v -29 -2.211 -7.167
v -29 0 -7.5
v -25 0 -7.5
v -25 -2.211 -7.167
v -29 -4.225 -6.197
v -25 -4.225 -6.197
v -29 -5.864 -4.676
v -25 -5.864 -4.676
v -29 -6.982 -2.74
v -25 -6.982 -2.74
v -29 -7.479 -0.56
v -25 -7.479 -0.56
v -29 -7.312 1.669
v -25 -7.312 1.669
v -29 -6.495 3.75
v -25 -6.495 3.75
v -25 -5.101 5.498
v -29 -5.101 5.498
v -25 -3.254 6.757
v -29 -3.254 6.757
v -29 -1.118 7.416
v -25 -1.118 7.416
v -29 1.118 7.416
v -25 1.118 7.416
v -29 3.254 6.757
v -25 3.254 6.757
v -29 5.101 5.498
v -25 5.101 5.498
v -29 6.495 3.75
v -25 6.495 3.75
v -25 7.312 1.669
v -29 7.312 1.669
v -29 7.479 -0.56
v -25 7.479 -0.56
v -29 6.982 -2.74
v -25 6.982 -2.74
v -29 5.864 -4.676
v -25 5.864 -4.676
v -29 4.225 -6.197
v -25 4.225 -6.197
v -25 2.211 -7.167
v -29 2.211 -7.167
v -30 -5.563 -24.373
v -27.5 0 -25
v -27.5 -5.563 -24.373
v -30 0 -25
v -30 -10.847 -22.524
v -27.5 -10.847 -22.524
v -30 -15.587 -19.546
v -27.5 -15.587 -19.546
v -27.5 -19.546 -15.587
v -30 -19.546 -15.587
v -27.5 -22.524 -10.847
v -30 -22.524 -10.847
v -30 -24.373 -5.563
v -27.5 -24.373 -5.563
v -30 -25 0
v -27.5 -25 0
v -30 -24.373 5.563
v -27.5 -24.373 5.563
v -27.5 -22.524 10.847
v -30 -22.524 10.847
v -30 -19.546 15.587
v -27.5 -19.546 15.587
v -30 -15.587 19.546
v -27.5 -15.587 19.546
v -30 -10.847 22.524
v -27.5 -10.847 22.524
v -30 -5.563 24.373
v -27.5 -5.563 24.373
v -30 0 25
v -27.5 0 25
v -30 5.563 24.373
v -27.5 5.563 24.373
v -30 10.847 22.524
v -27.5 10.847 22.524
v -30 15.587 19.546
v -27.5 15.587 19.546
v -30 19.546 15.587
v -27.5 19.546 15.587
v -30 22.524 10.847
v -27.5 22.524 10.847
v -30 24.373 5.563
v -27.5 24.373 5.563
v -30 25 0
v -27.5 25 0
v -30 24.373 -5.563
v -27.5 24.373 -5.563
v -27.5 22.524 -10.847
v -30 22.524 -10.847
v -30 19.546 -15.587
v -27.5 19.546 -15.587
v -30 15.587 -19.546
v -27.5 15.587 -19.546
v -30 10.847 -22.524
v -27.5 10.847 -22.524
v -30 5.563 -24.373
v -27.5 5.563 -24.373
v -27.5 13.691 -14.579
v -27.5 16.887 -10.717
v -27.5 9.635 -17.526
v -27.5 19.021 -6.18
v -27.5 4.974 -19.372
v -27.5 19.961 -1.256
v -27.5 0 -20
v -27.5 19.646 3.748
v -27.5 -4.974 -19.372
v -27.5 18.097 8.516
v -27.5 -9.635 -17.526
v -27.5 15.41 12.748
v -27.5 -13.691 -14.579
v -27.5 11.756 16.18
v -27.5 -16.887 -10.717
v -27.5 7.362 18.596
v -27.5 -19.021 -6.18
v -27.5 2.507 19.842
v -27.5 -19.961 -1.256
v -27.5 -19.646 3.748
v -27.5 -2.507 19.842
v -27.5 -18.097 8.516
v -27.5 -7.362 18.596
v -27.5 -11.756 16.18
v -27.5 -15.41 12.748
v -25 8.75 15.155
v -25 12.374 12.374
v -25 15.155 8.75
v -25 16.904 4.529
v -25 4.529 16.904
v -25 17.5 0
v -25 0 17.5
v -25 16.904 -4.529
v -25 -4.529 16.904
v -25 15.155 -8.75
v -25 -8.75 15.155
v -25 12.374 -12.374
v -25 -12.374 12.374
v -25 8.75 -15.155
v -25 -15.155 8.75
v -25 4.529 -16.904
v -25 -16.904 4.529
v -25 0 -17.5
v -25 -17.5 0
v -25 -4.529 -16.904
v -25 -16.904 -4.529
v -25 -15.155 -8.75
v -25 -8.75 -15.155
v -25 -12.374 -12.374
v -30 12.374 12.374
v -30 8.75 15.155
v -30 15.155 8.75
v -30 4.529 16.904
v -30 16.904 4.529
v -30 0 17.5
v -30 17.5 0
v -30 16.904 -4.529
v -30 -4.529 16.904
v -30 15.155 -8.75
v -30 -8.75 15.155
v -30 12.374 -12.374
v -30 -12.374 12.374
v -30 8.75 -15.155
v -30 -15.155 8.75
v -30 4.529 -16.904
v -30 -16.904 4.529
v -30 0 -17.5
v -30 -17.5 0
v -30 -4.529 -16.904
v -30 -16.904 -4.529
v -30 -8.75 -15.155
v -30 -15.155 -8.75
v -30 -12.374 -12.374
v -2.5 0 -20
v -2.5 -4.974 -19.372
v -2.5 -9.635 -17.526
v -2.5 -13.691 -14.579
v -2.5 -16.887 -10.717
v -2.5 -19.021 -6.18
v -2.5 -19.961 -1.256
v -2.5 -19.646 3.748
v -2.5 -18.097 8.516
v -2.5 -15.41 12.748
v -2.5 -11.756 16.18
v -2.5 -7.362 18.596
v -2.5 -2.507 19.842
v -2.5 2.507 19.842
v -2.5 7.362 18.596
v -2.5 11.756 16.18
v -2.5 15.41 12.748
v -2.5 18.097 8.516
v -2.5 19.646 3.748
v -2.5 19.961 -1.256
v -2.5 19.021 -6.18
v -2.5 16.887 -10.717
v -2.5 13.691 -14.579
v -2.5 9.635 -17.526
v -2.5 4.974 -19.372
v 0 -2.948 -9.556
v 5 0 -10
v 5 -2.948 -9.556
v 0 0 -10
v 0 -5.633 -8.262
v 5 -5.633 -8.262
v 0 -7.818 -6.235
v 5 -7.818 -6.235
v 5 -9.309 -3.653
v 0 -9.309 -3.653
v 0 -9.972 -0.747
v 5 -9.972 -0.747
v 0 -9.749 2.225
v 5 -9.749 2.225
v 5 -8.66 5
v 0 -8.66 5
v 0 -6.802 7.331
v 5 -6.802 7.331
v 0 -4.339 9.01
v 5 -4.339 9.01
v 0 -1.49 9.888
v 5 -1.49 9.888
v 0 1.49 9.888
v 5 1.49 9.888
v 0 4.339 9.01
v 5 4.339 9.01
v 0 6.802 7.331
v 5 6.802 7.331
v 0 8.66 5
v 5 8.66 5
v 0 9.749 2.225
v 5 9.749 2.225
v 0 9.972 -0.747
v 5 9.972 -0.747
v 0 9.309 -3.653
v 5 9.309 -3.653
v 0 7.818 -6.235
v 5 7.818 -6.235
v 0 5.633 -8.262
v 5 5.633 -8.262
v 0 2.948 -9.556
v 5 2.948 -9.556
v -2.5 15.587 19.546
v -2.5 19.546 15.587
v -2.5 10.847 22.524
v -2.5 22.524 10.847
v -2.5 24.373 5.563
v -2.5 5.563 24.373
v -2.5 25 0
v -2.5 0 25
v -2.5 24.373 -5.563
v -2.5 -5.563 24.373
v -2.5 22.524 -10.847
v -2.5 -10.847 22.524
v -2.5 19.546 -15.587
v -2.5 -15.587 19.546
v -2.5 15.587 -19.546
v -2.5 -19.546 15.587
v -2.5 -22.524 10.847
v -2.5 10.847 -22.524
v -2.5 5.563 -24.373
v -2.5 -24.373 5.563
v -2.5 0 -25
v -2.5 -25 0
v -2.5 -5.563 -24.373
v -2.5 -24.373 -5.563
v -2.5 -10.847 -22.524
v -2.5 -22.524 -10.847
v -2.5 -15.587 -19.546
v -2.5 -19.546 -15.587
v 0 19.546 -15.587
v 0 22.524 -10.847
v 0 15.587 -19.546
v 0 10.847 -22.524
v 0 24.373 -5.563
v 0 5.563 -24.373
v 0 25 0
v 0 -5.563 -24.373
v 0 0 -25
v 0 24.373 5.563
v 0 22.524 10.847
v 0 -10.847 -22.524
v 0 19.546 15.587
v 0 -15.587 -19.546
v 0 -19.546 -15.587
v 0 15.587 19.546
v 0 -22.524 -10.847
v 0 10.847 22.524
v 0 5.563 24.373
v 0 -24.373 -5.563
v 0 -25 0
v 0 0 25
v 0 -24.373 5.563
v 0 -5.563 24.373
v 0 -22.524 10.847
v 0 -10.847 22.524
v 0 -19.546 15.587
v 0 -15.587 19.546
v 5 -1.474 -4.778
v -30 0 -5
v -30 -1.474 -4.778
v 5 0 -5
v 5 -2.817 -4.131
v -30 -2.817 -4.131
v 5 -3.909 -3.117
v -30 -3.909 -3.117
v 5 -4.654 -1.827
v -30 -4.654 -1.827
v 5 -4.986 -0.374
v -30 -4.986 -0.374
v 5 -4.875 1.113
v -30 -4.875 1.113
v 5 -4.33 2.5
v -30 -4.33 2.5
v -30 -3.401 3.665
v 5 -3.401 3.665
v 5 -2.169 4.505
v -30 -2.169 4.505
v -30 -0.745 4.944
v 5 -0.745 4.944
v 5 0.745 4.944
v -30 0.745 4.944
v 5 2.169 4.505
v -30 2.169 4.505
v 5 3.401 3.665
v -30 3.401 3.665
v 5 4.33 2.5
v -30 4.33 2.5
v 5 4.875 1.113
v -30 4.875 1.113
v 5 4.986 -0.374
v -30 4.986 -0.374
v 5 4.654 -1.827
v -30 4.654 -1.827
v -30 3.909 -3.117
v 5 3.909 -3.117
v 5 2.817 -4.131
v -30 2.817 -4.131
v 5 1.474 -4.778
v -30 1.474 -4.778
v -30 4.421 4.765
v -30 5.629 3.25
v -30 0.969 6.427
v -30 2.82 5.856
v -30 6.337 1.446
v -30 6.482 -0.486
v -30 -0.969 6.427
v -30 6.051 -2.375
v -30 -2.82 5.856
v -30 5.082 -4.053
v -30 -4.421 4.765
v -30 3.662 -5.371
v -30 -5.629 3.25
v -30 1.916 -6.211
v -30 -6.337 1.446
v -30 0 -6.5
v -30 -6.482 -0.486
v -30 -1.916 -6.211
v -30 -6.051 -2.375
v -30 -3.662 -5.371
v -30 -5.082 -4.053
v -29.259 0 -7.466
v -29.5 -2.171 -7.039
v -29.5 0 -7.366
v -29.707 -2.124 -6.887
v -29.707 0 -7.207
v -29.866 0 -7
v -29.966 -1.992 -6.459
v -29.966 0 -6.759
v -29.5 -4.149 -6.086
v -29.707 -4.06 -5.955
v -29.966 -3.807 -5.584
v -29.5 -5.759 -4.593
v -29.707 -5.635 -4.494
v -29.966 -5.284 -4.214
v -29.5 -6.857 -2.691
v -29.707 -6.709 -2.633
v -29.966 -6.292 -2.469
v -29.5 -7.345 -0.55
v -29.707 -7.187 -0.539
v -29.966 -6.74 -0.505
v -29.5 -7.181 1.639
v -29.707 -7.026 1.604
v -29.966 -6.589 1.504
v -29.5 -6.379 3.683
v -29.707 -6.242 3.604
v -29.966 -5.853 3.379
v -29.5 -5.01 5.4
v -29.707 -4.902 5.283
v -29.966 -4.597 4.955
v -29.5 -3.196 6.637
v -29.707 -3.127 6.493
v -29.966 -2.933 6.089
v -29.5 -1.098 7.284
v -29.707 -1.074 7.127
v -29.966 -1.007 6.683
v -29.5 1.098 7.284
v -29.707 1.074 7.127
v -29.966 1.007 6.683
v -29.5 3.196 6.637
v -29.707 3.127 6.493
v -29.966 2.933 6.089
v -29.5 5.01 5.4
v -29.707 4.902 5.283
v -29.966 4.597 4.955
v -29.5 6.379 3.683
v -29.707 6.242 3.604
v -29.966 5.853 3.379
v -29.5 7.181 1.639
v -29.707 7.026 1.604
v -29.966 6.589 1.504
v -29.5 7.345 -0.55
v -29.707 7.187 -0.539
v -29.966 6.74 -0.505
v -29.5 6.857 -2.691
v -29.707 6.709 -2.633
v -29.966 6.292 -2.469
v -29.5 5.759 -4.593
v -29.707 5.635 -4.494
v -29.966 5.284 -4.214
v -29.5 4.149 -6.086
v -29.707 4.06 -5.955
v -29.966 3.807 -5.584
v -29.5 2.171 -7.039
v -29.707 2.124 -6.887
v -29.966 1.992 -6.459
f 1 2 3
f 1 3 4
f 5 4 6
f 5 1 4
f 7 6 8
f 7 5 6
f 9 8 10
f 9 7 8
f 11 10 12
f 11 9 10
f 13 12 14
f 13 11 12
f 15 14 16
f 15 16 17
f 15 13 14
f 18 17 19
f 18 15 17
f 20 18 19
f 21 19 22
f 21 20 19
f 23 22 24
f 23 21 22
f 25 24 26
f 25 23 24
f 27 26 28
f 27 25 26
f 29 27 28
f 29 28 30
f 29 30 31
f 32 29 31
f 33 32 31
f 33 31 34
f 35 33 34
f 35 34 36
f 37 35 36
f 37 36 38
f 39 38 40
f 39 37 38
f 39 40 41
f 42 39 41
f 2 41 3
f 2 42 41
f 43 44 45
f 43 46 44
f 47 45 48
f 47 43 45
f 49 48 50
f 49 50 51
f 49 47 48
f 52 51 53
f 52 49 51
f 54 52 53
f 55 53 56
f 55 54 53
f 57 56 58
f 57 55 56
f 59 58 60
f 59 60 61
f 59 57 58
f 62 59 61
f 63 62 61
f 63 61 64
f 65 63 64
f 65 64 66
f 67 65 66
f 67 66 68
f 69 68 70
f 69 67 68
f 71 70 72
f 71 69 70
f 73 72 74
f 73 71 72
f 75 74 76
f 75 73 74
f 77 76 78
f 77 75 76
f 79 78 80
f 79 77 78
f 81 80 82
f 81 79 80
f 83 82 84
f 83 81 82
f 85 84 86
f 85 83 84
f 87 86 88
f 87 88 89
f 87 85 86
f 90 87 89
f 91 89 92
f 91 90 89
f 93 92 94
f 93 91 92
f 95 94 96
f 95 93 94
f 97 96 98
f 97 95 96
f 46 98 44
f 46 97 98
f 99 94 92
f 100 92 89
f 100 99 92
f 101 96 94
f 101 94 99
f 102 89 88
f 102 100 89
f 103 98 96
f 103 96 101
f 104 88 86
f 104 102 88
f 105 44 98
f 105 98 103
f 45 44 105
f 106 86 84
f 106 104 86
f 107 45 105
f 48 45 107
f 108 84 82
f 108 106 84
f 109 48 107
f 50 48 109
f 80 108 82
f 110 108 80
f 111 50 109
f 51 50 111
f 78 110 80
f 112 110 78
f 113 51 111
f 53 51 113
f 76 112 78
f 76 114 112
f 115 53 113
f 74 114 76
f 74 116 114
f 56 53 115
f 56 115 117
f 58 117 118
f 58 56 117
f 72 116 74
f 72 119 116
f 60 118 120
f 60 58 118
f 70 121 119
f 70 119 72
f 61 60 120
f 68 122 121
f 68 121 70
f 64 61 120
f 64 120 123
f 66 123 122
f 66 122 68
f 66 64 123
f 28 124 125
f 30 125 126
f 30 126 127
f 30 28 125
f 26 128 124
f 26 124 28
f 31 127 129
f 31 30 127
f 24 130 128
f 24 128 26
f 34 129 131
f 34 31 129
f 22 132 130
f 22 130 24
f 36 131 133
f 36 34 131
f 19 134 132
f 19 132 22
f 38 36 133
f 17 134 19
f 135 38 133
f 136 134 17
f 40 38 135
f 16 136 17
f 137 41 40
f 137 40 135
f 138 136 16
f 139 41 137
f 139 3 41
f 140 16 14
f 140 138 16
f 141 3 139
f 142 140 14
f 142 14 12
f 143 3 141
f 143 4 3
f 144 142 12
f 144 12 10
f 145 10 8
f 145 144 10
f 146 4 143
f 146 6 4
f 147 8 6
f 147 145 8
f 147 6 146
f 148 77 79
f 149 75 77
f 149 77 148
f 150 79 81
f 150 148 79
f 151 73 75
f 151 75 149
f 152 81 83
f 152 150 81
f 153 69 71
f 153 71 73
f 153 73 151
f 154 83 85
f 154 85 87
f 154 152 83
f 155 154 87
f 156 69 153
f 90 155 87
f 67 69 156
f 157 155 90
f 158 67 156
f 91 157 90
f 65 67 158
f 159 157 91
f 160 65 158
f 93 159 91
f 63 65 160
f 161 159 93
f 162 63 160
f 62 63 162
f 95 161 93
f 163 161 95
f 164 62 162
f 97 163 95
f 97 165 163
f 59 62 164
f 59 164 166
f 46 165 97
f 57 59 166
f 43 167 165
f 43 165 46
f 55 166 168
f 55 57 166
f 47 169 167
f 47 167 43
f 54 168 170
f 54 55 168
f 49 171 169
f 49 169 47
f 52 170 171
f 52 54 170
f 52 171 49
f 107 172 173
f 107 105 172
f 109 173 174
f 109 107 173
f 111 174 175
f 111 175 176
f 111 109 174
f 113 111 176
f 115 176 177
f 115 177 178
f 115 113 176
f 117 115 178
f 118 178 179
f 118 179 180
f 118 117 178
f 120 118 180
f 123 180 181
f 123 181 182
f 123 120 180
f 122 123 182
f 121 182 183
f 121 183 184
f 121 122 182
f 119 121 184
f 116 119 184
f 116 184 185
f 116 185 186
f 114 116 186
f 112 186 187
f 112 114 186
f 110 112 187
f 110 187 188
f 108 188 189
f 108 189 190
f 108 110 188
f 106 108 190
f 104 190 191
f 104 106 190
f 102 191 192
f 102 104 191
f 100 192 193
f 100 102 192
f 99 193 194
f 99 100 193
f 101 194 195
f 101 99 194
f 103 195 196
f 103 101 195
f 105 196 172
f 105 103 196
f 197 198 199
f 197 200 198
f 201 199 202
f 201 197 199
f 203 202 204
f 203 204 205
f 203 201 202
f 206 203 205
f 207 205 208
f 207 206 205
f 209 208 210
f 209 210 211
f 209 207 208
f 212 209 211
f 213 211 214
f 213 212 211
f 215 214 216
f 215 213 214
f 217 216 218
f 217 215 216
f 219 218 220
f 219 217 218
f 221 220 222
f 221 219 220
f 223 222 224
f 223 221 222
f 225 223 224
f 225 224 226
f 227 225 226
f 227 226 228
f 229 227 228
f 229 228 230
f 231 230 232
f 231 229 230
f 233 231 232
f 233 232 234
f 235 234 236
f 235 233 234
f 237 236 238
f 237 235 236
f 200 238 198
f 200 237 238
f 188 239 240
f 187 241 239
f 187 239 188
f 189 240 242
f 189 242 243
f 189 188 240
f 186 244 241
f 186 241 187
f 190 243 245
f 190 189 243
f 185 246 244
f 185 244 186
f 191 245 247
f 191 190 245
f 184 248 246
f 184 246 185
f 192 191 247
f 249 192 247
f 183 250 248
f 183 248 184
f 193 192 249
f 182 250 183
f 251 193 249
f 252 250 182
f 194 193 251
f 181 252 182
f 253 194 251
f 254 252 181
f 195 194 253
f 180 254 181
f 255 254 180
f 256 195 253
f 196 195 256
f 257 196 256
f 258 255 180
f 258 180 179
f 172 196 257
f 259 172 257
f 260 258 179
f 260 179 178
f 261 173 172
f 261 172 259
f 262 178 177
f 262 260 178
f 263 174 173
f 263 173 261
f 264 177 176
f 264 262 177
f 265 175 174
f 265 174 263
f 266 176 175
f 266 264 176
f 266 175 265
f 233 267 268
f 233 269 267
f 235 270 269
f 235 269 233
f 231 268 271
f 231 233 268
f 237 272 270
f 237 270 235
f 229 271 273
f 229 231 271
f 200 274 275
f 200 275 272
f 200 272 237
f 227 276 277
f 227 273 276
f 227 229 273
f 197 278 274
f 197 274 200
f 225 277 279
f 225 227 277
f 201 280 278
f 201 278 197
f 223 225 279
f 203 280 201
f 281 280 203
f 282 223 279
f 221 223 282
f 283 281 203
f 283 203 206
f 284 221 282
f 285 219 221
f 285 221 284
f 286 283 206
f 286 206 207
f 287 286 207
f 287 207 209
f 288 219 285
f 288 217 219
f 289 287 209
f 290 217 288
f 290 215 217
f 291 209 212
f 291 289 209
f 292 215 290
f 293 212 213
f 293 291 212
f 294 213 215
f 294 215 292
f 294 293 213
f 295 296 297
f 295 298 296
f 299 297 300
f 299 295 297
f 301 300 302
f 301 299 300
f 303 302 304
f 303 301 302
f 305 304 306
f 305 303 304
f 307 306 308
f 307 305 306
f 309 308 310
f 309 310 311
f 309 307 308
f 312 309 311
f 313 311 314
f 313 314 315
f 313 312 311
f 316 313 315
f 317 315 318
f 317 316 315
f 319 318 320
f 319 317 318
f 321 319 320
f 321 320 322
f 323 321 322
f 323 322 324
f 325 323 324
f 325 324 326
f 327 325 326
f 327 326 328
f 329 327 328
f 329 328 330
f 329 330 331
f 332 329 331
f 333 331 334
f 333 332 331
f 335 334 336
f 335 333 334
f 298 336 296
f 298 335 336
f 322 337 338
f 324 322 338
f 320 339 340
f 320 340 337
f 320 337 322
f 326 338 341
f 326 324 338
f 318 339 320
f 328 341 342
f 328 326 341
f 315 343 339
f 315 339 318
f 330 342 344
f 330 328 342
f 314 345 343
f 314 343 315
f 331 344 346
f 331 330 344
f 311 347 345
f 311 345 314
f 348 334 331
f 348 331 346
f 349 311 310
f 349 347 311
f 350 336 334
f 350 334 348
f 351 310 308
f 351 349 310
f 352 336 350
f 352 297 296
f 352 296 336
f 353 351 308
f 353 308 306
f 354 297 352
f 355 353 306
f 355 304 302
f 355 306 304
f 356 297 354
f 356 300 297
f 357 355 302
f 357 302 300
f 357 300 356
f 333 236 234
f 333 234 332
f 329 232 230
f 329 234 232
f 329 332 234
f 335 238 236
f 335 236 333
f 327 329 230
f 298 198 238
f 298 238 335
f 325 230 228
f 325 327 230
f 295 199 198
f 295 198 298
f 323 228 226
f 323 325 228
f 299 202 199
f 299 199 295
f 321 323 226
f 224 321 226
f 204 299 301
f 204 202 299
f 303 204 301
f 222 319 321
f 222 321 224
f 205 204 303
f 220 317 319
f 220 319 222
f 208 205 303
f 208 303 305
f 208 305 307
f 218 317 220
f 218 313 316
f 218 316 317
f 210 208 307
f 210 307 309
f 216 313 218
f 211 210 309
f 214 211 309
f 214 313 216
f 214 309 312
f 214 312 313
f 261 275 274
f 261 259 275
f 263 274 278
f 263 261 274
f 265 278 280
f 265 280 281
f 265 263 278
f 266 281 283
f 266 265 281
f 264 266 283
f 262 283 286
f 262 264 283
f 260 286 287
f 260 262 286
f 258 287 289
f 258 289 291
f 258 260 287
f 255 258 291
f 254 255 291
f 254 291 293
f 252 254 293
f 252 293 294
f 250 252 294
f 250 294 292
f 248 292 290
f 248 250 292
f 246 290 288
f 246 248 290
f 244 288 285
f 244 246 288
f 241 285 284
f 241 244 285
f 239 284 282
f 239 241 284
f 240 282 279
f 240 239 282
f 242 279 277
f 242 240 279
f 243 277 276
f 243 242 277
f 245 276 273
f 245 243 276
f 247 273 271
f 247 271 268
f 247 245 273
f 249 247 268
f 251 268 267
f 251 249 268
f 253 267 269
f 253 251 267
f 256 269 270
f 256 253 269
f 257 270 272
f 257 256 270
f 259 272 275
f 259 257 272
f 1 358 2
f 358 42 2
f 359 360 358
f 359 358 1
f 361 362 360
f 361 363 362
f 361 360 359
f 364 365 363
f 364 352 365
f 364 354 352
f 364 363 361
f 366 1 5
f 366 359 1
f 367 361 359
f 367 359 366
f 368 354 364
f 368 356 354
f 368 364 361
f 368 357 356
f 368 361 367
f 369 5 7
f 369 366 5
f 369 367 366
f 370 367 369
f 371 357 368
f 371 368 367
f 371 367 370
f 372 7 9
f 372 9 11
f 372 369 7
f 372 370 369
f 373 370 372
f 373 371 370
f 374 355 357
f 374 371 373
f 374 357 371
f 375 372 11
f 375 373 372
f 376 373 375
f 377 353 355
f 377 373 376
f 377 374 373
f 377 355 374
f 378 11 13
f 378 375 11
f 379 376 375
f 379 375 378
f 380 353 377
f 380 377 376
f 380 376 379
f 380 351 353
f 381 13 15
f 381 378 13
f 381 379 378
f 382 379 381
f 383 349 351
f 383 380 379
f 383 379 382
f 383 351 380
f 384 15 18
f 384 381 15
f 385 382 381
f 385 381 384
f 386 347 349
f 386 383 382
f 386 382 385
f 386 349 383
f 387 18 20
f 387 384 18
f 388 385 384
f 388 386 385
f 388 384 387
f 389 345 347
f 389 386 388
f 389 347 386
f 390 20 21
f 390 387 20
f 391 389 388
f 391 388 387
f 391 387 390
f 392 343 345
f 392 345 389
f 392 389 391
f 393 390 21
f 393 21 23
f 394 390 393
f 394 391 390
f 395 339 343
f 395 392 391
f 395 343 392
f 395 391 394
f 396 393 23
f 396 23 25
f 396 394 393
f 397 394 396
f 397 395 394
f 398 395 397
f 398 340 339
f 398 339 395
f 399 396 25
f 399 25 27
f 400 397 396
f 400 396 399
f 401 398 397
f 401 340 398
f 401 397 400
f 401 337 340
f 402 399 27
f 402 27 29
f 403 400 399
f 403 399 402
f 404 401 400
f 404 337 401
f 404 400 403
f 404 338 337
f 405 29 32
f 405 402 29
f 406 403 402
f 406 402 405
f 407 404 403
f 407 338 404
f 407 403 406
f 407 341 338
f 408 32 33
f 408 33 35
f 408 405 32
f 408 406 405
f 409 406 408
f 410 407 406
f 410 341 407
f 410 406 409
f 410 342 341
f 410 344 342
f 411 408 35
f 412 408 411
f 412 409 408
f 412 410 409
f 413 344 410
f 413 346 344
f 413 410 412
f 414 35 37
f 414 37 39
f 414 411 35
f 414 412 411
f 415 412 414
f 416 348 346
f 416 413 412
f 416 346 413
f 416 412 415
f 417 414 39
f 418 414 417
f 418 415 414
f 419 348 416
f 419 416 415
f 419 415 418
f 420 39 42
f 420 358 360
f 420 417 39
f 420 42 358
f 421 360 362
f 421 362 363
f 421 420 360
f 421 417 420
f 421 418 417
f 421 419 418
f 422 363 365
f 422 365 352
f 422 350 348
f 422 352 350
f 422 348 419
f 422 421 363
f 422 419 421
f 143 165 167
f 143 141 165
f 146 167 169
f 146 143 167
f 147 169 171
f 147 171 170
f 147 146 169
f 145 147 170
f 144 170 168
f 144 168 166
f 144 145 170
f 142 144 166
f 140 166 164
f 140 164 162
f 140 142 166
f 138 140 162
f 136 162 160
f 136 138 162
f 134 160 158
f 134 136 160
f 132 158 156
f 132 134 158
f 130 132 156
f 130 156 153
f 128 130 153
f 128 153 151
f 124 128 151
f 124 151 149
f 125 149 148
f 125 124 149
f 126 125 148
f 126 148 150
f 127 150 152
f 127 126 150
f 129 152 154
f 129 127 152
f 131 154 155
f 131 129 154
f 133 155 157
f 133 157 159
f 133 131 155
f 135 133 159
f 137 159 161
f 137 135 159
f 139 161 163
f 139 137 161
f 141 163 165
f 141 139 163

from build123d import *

# Parameters (mm, degrees)
FILLET1_R = 1


with BuildPart() as part:
    # Sketch1 → Revolve1 (revolve)
    with BuildSketch(Plane.XY, mode=Mode.PRIVATE) as revolve1_sk:
        Polygon((0, 10), (0, 25), (-2.5, 25), (-2.5, 20), (-27.5, 20), (-27.5, 25), (-30, 25), (-30, 17.5), (-25, 17.5), (-25, 7.5), (-30, 7.5), (-30, 5), (5, 5), (5, 10), align=None)
    revolve(revolve1_sk.sketch.rotate(Axis((0, 0, 0), (-1, 0, 0)), 90), axis=Axis((0, 0, 0), (-1, 0, 0)))

    # Fillet1
    fillet1_edges = [part.edges().sort_by_distance(p)[0] for p in [
        (-30, 0, 7.5),
    ]]
    fillet(fillet1_edges, radius=FILLET1_R)


solid = part.part
